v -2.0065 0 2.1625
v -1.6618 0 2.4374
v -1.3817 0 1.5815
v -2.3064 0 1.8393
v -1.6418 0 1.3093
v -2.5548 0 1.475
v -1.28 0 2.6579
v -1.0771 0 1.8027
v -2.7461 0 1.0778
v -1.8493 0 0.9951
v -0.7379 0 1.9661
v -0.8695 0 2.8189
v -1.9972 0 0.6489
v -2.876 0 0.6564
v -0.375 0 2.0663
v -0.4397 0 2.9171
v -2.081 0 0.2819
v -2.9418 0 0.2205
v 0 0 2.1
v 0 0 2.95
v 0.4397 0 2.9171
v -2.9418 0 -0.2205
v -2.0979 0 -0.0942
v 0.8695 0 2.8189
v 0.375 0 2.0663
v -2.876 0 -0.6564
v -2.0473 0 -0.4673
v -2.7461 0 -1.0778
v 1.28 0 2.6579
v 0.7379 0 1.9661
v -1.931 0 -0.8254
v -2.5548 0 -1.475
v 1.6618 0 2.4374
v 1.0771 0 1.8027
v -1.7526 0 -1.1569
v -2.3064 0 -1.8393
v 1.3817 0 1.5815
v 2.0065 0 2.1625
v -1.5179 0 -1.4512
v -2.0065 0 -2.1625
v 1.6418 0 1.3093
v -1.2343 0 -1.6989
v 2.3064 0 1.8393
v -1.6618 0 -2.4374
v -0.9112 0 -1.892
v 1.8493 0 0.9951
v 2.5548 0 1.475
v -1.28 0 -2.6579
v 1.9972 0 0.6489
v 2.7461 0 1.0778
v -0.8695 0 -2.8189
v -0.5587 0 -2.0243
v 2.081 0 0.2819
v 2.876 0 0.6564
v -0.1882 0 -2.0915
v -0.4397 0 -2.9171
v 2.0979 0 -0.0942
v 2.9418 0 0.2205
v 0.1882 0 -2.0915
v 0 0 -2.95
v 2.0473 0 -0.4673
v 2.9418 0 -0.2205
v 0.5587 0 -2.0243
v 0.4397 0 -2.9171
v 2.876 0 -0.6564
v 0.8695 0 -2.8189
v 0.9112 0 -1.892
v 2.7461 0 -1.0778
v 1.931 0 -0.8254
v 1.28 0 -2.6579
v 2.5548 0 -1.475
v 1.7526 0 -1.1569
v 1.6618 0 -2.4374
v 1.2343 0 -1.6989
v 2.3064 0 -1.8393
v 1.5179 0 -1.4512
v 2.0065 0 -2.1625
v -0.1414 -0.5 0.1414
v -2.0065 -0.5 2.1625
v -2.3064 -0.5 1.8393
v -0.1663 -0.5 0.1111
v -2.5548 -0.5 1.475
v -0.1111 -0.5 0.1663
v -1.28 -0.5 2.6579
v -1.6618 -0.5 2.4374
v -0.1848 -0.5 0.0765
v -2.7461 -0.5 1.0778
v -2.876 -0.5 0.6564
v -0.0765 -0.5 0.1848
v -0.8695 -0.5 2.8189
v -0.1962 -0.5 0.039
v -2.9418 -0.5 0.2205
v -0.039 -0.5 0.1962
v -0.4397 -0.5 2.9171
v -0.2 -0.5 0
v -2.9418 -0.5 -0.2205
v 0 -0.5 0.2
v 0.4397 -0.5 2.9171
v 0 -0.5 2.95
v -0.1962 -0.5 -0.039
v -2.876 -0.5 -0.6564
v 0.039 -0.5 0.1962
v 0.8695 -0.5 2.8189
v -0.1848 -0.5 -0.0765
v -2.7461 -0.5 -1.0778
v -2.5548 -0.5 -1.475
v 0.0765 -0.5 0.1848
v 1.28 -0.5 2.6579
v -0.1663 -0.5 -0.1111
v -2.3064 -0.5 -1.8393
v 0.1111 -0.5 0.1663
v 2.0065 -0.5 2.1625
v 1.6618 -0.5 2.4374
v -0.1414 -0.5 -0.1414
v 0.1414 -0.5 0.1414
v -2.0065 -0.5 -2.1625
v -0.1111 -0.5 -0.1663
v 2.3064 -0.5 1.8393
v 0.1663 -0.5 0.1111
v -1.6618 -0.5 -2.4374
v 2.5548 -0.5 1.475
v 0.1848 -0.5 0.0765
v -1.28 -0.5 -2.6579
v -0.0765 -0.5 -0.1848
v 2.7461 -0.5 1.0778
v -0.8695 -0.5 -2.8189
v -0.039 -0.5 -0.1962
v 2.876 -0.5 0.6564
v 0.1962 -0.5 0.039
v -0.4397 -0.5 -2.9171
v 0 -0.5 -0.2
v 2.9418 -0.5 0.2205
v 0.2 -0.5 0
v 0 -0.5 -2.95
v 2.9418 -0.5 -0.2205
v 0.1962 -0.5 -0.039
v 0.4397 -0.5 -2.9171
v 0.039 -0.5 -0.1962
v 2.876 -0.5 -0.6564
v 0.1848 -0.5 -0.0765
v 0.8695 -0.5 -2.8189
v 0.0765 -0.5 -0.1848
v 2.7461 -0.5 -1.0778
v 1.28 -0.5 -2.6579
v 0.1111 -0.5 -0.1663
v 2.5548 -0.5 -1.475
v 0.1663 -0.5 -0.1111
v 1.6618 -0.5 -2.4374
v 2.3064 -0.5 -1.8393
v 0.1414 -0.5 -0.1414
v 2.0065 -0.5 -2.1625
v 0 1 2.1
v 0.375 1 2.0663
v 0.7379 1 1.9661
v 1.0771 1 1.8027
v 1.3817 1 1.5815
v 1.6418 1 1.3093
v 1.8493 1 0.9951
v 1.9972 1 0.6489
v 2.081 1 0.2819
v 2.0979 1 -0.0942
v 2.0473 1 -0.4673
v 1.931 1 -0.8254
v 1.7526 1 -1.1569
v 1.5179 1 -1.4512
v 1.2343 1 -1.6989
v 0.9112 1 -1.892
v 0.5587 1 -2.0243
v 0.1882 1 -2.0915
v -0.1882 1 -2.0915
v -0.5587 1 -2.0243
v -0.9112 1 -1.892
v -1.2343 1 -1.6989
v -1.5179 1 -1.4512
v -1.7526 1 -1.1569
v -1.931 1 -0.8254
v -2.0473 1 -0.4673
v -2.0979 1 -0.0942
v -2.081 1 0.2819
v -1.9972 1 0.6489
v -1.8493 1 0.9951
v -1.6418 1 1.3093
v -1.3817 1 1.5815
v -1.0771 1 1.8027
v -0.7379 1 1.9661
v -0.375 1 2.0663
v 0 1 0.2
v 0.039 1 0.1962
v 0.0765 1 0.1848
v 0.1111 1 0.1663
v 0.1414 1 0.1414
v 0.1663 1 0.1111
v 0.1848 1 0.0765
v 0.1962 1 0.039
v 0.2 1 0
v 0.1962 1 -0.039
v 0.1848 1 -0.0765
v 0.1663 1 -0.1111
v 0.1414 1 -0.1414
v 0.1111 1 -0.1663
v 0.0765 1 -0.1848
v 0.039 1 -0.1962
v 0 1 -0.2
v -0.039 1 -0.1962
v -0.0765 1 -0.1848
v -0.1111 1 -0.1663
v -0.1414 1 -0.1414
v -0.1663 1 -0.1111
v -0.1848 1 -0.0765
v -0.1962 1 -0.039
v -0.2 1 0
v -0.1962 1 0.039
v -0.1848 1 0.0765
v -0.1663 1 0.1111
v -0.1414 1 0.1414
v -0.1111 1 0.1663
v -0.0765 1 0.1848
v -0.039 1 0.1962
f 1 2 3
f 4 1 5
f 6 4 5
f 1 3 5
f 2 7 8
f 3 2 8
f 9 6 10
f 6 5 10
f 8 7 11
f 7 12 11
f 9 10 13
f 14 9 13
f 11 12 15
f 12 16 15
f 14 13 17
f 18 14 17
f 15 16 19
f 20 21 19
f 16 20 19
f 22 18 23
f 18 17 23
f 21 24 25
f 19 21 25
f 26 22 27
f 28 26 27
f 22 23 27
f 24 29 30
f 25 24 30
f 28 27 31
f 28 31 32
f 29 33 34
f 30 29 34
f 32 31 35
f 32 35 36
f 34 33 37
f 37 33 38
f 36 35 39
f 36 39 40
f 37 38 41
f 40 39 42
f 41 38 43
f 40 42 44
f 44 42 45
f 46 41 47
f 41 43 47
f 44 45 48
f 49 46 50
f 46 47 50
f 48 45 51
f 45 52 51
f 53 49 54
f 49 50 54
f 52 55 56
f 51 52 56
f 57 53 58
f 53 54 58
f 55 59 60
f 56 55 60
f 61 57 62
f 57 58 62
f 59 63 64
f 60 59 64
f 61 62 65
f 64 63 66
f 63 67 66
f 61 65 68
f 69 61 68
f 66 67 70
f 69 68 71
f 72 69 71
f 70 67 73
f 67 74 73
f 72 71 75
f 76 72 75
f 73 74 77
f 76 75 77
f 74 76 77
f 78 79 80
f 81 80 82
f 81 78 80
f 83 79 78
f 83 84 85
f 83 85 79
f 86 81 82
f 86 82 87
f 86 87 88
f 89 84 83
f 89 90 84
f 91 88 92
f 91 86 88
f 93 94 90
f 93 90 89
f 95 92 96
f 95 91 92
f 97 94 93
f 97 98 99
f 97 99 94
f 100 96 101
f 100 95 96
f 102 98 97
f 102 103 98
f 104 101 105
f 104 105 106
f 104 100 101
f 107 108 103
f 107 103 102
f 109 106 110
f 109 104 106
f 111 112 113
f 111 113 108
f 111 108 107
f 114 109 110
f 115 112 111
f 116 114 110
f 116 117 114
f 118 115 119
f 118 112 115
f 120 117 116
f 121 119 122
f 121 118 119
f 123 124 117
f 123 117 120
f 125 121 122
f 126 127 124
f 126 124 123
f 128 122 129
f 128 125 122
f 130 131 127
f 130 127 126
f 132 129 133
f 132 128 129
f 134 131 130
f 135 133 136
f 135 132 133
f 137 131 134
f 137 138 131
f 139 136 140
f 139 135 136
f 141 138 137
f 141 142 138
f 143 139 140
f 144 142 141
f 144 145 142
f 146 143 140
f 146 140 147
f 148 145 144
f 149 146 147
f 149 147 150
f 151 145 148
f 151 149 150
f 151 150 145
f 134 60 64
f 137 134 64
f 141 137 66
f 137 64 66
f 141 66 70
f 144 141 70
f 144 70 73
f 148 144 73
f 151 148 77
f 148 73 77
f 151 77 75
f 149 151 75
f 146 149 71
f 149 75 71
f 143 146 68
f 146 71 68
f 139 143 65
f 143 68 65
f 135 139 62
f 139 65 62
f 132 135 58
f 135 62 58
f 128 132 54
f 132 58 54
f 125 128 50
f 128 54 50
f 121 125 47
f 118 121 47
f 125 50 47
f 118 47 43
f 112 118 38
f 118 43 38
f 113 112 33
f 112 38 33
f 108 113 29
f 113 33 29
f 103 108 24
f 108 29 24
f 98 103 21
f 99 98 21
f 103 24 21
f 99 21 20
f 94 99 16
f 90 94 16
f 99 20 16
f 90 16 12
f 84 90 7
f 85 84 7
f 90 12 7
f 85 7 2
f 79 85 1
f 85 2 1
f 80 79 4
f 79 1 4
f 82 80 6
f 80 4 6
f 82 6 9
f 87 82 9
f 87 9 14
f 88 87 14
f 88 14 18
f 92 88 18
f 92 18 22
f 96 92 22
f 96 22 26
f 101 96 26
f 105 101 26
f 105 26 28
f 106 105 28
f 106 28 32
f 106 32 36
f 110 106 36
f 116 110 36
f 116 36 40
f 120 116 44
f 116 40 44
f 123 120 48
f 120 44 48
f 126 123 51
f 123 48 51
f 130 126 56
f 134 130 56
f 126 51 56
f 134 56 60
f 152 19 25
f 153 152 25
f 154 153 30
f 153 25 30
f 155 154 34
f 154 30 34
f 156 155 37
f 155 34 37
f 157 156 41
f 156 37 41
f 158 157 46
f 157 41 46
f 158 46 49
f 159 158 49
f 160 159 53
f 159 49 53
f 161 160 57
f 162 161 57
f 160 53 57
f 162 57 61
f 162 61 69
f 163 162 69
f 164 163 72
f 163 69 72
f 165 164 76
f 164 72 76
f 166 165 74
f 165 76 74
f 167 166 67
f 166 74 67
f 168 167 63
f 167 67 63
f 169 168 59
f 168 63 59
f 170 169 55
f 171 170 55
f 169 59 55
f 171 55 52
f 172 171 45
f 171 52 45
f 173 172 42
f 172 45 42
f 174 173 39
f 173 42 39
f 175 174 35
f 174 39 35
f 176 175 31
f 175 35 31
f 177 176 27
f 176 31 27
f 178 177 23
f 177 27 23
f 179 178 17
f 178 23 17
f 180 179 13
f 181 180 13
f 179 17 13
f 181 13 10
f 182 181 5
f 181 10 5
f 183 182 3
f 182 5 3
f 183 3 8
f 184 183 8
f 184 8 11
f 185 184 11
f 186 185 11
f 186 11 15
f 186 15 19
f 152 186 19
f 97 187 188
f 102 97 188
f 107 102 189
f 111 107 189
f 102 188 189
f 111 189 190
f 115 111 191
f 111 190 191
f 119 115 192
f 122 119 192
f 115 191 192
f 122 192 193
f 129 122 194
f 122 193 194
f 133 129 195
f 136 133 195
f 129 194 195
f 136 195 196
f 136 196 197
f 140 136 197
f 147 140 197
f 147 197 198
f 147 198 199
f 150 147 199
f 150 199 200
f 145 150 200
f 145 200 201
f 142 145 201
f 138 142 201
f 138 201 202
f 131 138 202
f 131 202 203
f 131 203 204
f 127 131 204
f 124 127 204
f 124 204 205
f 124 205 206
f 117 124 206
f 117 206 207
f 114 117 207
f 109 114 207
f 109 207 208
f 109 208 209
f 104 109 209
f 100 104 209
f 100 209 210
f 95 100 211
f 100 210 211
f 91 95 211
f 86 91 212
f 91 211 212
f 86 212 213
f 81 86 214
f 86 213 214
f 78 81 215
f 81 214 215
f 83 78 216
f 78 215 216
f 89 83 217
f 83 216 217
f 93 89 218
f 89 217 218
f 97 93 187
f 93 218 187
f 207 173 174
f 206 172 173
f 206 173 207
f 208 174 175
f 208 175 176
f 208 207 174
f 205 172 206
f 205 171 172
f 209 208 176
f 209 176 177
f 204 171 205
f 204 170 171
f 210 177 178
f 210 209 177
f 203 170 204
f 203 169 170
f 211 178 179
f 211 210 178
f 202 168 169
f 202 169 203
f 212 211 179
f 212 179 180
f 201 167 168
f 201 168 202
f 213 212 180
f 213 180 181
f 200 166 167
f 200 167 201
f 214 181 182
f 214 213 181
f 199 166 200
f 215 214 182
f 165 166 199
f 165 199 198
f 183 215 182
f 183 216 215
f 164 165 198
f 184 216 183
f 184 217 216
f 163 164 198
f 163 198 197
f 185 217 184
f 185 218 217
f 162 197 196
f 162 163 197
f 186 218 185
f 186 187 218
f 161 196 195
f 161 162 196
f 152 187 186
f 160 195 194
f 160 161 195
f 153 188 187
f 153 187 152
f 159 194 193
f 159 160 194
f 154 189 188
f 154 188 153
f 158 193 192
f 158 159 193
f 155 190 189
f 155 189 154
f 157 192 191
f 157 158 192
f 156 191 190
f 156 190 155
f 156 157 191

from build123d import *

# Parameters (mm, degrees)
SKETCH1_R           = 2.1
BOSS_EXTRUDE1_DEPTH = 1
SKETCH2_R           = 2.95
BOSS_EXTRUDE2_DEPTH = 0.5
SKETCH3_R           = 0.2
CUT_EXTRUDE1_DEPTH  = 5.43339599


with BuildPart() as part:
    # Sketch1 → Boss-Extrude1 (new body)
    with BuildSketch(Plane(origin=(0, 0, 0), x_dir=(1, 0, 0), z_dir=(0, 1, 0))):
        with Locations(Location((0, 0, 0), (0, 0, 270))):
            Circle(SKETCH1_R)
    extrude(amount=BOSS_EXTRUDE1_DEPTH)

    # Sketch2 → Boss-Extrude2 (add)
    with BuildSketch(Plane.XZ):
        with Locations(Location((0, 0, 0), (0, 0, 270))):
            Circle(SKETCH2_R)
    extrude(amount=BOSS_EXTRUDE2_DEPTH)

    # Sketch3 → Cut-Extrude1 (cut, through all)
    with BuildSketch(Plane(origin=(0, 1, 0), x_dir=(1, 0, 0), z_dir=(0, 1, 0))):
        with Locations(Location((0, 0, 0), (0, 0, 270))):
            Circle(SKETCH3_R)
    extrude(amount=-CUT_EXTRUDE1_DEPTH, mode=Mode.SUBTRACT)


solid = part.part
